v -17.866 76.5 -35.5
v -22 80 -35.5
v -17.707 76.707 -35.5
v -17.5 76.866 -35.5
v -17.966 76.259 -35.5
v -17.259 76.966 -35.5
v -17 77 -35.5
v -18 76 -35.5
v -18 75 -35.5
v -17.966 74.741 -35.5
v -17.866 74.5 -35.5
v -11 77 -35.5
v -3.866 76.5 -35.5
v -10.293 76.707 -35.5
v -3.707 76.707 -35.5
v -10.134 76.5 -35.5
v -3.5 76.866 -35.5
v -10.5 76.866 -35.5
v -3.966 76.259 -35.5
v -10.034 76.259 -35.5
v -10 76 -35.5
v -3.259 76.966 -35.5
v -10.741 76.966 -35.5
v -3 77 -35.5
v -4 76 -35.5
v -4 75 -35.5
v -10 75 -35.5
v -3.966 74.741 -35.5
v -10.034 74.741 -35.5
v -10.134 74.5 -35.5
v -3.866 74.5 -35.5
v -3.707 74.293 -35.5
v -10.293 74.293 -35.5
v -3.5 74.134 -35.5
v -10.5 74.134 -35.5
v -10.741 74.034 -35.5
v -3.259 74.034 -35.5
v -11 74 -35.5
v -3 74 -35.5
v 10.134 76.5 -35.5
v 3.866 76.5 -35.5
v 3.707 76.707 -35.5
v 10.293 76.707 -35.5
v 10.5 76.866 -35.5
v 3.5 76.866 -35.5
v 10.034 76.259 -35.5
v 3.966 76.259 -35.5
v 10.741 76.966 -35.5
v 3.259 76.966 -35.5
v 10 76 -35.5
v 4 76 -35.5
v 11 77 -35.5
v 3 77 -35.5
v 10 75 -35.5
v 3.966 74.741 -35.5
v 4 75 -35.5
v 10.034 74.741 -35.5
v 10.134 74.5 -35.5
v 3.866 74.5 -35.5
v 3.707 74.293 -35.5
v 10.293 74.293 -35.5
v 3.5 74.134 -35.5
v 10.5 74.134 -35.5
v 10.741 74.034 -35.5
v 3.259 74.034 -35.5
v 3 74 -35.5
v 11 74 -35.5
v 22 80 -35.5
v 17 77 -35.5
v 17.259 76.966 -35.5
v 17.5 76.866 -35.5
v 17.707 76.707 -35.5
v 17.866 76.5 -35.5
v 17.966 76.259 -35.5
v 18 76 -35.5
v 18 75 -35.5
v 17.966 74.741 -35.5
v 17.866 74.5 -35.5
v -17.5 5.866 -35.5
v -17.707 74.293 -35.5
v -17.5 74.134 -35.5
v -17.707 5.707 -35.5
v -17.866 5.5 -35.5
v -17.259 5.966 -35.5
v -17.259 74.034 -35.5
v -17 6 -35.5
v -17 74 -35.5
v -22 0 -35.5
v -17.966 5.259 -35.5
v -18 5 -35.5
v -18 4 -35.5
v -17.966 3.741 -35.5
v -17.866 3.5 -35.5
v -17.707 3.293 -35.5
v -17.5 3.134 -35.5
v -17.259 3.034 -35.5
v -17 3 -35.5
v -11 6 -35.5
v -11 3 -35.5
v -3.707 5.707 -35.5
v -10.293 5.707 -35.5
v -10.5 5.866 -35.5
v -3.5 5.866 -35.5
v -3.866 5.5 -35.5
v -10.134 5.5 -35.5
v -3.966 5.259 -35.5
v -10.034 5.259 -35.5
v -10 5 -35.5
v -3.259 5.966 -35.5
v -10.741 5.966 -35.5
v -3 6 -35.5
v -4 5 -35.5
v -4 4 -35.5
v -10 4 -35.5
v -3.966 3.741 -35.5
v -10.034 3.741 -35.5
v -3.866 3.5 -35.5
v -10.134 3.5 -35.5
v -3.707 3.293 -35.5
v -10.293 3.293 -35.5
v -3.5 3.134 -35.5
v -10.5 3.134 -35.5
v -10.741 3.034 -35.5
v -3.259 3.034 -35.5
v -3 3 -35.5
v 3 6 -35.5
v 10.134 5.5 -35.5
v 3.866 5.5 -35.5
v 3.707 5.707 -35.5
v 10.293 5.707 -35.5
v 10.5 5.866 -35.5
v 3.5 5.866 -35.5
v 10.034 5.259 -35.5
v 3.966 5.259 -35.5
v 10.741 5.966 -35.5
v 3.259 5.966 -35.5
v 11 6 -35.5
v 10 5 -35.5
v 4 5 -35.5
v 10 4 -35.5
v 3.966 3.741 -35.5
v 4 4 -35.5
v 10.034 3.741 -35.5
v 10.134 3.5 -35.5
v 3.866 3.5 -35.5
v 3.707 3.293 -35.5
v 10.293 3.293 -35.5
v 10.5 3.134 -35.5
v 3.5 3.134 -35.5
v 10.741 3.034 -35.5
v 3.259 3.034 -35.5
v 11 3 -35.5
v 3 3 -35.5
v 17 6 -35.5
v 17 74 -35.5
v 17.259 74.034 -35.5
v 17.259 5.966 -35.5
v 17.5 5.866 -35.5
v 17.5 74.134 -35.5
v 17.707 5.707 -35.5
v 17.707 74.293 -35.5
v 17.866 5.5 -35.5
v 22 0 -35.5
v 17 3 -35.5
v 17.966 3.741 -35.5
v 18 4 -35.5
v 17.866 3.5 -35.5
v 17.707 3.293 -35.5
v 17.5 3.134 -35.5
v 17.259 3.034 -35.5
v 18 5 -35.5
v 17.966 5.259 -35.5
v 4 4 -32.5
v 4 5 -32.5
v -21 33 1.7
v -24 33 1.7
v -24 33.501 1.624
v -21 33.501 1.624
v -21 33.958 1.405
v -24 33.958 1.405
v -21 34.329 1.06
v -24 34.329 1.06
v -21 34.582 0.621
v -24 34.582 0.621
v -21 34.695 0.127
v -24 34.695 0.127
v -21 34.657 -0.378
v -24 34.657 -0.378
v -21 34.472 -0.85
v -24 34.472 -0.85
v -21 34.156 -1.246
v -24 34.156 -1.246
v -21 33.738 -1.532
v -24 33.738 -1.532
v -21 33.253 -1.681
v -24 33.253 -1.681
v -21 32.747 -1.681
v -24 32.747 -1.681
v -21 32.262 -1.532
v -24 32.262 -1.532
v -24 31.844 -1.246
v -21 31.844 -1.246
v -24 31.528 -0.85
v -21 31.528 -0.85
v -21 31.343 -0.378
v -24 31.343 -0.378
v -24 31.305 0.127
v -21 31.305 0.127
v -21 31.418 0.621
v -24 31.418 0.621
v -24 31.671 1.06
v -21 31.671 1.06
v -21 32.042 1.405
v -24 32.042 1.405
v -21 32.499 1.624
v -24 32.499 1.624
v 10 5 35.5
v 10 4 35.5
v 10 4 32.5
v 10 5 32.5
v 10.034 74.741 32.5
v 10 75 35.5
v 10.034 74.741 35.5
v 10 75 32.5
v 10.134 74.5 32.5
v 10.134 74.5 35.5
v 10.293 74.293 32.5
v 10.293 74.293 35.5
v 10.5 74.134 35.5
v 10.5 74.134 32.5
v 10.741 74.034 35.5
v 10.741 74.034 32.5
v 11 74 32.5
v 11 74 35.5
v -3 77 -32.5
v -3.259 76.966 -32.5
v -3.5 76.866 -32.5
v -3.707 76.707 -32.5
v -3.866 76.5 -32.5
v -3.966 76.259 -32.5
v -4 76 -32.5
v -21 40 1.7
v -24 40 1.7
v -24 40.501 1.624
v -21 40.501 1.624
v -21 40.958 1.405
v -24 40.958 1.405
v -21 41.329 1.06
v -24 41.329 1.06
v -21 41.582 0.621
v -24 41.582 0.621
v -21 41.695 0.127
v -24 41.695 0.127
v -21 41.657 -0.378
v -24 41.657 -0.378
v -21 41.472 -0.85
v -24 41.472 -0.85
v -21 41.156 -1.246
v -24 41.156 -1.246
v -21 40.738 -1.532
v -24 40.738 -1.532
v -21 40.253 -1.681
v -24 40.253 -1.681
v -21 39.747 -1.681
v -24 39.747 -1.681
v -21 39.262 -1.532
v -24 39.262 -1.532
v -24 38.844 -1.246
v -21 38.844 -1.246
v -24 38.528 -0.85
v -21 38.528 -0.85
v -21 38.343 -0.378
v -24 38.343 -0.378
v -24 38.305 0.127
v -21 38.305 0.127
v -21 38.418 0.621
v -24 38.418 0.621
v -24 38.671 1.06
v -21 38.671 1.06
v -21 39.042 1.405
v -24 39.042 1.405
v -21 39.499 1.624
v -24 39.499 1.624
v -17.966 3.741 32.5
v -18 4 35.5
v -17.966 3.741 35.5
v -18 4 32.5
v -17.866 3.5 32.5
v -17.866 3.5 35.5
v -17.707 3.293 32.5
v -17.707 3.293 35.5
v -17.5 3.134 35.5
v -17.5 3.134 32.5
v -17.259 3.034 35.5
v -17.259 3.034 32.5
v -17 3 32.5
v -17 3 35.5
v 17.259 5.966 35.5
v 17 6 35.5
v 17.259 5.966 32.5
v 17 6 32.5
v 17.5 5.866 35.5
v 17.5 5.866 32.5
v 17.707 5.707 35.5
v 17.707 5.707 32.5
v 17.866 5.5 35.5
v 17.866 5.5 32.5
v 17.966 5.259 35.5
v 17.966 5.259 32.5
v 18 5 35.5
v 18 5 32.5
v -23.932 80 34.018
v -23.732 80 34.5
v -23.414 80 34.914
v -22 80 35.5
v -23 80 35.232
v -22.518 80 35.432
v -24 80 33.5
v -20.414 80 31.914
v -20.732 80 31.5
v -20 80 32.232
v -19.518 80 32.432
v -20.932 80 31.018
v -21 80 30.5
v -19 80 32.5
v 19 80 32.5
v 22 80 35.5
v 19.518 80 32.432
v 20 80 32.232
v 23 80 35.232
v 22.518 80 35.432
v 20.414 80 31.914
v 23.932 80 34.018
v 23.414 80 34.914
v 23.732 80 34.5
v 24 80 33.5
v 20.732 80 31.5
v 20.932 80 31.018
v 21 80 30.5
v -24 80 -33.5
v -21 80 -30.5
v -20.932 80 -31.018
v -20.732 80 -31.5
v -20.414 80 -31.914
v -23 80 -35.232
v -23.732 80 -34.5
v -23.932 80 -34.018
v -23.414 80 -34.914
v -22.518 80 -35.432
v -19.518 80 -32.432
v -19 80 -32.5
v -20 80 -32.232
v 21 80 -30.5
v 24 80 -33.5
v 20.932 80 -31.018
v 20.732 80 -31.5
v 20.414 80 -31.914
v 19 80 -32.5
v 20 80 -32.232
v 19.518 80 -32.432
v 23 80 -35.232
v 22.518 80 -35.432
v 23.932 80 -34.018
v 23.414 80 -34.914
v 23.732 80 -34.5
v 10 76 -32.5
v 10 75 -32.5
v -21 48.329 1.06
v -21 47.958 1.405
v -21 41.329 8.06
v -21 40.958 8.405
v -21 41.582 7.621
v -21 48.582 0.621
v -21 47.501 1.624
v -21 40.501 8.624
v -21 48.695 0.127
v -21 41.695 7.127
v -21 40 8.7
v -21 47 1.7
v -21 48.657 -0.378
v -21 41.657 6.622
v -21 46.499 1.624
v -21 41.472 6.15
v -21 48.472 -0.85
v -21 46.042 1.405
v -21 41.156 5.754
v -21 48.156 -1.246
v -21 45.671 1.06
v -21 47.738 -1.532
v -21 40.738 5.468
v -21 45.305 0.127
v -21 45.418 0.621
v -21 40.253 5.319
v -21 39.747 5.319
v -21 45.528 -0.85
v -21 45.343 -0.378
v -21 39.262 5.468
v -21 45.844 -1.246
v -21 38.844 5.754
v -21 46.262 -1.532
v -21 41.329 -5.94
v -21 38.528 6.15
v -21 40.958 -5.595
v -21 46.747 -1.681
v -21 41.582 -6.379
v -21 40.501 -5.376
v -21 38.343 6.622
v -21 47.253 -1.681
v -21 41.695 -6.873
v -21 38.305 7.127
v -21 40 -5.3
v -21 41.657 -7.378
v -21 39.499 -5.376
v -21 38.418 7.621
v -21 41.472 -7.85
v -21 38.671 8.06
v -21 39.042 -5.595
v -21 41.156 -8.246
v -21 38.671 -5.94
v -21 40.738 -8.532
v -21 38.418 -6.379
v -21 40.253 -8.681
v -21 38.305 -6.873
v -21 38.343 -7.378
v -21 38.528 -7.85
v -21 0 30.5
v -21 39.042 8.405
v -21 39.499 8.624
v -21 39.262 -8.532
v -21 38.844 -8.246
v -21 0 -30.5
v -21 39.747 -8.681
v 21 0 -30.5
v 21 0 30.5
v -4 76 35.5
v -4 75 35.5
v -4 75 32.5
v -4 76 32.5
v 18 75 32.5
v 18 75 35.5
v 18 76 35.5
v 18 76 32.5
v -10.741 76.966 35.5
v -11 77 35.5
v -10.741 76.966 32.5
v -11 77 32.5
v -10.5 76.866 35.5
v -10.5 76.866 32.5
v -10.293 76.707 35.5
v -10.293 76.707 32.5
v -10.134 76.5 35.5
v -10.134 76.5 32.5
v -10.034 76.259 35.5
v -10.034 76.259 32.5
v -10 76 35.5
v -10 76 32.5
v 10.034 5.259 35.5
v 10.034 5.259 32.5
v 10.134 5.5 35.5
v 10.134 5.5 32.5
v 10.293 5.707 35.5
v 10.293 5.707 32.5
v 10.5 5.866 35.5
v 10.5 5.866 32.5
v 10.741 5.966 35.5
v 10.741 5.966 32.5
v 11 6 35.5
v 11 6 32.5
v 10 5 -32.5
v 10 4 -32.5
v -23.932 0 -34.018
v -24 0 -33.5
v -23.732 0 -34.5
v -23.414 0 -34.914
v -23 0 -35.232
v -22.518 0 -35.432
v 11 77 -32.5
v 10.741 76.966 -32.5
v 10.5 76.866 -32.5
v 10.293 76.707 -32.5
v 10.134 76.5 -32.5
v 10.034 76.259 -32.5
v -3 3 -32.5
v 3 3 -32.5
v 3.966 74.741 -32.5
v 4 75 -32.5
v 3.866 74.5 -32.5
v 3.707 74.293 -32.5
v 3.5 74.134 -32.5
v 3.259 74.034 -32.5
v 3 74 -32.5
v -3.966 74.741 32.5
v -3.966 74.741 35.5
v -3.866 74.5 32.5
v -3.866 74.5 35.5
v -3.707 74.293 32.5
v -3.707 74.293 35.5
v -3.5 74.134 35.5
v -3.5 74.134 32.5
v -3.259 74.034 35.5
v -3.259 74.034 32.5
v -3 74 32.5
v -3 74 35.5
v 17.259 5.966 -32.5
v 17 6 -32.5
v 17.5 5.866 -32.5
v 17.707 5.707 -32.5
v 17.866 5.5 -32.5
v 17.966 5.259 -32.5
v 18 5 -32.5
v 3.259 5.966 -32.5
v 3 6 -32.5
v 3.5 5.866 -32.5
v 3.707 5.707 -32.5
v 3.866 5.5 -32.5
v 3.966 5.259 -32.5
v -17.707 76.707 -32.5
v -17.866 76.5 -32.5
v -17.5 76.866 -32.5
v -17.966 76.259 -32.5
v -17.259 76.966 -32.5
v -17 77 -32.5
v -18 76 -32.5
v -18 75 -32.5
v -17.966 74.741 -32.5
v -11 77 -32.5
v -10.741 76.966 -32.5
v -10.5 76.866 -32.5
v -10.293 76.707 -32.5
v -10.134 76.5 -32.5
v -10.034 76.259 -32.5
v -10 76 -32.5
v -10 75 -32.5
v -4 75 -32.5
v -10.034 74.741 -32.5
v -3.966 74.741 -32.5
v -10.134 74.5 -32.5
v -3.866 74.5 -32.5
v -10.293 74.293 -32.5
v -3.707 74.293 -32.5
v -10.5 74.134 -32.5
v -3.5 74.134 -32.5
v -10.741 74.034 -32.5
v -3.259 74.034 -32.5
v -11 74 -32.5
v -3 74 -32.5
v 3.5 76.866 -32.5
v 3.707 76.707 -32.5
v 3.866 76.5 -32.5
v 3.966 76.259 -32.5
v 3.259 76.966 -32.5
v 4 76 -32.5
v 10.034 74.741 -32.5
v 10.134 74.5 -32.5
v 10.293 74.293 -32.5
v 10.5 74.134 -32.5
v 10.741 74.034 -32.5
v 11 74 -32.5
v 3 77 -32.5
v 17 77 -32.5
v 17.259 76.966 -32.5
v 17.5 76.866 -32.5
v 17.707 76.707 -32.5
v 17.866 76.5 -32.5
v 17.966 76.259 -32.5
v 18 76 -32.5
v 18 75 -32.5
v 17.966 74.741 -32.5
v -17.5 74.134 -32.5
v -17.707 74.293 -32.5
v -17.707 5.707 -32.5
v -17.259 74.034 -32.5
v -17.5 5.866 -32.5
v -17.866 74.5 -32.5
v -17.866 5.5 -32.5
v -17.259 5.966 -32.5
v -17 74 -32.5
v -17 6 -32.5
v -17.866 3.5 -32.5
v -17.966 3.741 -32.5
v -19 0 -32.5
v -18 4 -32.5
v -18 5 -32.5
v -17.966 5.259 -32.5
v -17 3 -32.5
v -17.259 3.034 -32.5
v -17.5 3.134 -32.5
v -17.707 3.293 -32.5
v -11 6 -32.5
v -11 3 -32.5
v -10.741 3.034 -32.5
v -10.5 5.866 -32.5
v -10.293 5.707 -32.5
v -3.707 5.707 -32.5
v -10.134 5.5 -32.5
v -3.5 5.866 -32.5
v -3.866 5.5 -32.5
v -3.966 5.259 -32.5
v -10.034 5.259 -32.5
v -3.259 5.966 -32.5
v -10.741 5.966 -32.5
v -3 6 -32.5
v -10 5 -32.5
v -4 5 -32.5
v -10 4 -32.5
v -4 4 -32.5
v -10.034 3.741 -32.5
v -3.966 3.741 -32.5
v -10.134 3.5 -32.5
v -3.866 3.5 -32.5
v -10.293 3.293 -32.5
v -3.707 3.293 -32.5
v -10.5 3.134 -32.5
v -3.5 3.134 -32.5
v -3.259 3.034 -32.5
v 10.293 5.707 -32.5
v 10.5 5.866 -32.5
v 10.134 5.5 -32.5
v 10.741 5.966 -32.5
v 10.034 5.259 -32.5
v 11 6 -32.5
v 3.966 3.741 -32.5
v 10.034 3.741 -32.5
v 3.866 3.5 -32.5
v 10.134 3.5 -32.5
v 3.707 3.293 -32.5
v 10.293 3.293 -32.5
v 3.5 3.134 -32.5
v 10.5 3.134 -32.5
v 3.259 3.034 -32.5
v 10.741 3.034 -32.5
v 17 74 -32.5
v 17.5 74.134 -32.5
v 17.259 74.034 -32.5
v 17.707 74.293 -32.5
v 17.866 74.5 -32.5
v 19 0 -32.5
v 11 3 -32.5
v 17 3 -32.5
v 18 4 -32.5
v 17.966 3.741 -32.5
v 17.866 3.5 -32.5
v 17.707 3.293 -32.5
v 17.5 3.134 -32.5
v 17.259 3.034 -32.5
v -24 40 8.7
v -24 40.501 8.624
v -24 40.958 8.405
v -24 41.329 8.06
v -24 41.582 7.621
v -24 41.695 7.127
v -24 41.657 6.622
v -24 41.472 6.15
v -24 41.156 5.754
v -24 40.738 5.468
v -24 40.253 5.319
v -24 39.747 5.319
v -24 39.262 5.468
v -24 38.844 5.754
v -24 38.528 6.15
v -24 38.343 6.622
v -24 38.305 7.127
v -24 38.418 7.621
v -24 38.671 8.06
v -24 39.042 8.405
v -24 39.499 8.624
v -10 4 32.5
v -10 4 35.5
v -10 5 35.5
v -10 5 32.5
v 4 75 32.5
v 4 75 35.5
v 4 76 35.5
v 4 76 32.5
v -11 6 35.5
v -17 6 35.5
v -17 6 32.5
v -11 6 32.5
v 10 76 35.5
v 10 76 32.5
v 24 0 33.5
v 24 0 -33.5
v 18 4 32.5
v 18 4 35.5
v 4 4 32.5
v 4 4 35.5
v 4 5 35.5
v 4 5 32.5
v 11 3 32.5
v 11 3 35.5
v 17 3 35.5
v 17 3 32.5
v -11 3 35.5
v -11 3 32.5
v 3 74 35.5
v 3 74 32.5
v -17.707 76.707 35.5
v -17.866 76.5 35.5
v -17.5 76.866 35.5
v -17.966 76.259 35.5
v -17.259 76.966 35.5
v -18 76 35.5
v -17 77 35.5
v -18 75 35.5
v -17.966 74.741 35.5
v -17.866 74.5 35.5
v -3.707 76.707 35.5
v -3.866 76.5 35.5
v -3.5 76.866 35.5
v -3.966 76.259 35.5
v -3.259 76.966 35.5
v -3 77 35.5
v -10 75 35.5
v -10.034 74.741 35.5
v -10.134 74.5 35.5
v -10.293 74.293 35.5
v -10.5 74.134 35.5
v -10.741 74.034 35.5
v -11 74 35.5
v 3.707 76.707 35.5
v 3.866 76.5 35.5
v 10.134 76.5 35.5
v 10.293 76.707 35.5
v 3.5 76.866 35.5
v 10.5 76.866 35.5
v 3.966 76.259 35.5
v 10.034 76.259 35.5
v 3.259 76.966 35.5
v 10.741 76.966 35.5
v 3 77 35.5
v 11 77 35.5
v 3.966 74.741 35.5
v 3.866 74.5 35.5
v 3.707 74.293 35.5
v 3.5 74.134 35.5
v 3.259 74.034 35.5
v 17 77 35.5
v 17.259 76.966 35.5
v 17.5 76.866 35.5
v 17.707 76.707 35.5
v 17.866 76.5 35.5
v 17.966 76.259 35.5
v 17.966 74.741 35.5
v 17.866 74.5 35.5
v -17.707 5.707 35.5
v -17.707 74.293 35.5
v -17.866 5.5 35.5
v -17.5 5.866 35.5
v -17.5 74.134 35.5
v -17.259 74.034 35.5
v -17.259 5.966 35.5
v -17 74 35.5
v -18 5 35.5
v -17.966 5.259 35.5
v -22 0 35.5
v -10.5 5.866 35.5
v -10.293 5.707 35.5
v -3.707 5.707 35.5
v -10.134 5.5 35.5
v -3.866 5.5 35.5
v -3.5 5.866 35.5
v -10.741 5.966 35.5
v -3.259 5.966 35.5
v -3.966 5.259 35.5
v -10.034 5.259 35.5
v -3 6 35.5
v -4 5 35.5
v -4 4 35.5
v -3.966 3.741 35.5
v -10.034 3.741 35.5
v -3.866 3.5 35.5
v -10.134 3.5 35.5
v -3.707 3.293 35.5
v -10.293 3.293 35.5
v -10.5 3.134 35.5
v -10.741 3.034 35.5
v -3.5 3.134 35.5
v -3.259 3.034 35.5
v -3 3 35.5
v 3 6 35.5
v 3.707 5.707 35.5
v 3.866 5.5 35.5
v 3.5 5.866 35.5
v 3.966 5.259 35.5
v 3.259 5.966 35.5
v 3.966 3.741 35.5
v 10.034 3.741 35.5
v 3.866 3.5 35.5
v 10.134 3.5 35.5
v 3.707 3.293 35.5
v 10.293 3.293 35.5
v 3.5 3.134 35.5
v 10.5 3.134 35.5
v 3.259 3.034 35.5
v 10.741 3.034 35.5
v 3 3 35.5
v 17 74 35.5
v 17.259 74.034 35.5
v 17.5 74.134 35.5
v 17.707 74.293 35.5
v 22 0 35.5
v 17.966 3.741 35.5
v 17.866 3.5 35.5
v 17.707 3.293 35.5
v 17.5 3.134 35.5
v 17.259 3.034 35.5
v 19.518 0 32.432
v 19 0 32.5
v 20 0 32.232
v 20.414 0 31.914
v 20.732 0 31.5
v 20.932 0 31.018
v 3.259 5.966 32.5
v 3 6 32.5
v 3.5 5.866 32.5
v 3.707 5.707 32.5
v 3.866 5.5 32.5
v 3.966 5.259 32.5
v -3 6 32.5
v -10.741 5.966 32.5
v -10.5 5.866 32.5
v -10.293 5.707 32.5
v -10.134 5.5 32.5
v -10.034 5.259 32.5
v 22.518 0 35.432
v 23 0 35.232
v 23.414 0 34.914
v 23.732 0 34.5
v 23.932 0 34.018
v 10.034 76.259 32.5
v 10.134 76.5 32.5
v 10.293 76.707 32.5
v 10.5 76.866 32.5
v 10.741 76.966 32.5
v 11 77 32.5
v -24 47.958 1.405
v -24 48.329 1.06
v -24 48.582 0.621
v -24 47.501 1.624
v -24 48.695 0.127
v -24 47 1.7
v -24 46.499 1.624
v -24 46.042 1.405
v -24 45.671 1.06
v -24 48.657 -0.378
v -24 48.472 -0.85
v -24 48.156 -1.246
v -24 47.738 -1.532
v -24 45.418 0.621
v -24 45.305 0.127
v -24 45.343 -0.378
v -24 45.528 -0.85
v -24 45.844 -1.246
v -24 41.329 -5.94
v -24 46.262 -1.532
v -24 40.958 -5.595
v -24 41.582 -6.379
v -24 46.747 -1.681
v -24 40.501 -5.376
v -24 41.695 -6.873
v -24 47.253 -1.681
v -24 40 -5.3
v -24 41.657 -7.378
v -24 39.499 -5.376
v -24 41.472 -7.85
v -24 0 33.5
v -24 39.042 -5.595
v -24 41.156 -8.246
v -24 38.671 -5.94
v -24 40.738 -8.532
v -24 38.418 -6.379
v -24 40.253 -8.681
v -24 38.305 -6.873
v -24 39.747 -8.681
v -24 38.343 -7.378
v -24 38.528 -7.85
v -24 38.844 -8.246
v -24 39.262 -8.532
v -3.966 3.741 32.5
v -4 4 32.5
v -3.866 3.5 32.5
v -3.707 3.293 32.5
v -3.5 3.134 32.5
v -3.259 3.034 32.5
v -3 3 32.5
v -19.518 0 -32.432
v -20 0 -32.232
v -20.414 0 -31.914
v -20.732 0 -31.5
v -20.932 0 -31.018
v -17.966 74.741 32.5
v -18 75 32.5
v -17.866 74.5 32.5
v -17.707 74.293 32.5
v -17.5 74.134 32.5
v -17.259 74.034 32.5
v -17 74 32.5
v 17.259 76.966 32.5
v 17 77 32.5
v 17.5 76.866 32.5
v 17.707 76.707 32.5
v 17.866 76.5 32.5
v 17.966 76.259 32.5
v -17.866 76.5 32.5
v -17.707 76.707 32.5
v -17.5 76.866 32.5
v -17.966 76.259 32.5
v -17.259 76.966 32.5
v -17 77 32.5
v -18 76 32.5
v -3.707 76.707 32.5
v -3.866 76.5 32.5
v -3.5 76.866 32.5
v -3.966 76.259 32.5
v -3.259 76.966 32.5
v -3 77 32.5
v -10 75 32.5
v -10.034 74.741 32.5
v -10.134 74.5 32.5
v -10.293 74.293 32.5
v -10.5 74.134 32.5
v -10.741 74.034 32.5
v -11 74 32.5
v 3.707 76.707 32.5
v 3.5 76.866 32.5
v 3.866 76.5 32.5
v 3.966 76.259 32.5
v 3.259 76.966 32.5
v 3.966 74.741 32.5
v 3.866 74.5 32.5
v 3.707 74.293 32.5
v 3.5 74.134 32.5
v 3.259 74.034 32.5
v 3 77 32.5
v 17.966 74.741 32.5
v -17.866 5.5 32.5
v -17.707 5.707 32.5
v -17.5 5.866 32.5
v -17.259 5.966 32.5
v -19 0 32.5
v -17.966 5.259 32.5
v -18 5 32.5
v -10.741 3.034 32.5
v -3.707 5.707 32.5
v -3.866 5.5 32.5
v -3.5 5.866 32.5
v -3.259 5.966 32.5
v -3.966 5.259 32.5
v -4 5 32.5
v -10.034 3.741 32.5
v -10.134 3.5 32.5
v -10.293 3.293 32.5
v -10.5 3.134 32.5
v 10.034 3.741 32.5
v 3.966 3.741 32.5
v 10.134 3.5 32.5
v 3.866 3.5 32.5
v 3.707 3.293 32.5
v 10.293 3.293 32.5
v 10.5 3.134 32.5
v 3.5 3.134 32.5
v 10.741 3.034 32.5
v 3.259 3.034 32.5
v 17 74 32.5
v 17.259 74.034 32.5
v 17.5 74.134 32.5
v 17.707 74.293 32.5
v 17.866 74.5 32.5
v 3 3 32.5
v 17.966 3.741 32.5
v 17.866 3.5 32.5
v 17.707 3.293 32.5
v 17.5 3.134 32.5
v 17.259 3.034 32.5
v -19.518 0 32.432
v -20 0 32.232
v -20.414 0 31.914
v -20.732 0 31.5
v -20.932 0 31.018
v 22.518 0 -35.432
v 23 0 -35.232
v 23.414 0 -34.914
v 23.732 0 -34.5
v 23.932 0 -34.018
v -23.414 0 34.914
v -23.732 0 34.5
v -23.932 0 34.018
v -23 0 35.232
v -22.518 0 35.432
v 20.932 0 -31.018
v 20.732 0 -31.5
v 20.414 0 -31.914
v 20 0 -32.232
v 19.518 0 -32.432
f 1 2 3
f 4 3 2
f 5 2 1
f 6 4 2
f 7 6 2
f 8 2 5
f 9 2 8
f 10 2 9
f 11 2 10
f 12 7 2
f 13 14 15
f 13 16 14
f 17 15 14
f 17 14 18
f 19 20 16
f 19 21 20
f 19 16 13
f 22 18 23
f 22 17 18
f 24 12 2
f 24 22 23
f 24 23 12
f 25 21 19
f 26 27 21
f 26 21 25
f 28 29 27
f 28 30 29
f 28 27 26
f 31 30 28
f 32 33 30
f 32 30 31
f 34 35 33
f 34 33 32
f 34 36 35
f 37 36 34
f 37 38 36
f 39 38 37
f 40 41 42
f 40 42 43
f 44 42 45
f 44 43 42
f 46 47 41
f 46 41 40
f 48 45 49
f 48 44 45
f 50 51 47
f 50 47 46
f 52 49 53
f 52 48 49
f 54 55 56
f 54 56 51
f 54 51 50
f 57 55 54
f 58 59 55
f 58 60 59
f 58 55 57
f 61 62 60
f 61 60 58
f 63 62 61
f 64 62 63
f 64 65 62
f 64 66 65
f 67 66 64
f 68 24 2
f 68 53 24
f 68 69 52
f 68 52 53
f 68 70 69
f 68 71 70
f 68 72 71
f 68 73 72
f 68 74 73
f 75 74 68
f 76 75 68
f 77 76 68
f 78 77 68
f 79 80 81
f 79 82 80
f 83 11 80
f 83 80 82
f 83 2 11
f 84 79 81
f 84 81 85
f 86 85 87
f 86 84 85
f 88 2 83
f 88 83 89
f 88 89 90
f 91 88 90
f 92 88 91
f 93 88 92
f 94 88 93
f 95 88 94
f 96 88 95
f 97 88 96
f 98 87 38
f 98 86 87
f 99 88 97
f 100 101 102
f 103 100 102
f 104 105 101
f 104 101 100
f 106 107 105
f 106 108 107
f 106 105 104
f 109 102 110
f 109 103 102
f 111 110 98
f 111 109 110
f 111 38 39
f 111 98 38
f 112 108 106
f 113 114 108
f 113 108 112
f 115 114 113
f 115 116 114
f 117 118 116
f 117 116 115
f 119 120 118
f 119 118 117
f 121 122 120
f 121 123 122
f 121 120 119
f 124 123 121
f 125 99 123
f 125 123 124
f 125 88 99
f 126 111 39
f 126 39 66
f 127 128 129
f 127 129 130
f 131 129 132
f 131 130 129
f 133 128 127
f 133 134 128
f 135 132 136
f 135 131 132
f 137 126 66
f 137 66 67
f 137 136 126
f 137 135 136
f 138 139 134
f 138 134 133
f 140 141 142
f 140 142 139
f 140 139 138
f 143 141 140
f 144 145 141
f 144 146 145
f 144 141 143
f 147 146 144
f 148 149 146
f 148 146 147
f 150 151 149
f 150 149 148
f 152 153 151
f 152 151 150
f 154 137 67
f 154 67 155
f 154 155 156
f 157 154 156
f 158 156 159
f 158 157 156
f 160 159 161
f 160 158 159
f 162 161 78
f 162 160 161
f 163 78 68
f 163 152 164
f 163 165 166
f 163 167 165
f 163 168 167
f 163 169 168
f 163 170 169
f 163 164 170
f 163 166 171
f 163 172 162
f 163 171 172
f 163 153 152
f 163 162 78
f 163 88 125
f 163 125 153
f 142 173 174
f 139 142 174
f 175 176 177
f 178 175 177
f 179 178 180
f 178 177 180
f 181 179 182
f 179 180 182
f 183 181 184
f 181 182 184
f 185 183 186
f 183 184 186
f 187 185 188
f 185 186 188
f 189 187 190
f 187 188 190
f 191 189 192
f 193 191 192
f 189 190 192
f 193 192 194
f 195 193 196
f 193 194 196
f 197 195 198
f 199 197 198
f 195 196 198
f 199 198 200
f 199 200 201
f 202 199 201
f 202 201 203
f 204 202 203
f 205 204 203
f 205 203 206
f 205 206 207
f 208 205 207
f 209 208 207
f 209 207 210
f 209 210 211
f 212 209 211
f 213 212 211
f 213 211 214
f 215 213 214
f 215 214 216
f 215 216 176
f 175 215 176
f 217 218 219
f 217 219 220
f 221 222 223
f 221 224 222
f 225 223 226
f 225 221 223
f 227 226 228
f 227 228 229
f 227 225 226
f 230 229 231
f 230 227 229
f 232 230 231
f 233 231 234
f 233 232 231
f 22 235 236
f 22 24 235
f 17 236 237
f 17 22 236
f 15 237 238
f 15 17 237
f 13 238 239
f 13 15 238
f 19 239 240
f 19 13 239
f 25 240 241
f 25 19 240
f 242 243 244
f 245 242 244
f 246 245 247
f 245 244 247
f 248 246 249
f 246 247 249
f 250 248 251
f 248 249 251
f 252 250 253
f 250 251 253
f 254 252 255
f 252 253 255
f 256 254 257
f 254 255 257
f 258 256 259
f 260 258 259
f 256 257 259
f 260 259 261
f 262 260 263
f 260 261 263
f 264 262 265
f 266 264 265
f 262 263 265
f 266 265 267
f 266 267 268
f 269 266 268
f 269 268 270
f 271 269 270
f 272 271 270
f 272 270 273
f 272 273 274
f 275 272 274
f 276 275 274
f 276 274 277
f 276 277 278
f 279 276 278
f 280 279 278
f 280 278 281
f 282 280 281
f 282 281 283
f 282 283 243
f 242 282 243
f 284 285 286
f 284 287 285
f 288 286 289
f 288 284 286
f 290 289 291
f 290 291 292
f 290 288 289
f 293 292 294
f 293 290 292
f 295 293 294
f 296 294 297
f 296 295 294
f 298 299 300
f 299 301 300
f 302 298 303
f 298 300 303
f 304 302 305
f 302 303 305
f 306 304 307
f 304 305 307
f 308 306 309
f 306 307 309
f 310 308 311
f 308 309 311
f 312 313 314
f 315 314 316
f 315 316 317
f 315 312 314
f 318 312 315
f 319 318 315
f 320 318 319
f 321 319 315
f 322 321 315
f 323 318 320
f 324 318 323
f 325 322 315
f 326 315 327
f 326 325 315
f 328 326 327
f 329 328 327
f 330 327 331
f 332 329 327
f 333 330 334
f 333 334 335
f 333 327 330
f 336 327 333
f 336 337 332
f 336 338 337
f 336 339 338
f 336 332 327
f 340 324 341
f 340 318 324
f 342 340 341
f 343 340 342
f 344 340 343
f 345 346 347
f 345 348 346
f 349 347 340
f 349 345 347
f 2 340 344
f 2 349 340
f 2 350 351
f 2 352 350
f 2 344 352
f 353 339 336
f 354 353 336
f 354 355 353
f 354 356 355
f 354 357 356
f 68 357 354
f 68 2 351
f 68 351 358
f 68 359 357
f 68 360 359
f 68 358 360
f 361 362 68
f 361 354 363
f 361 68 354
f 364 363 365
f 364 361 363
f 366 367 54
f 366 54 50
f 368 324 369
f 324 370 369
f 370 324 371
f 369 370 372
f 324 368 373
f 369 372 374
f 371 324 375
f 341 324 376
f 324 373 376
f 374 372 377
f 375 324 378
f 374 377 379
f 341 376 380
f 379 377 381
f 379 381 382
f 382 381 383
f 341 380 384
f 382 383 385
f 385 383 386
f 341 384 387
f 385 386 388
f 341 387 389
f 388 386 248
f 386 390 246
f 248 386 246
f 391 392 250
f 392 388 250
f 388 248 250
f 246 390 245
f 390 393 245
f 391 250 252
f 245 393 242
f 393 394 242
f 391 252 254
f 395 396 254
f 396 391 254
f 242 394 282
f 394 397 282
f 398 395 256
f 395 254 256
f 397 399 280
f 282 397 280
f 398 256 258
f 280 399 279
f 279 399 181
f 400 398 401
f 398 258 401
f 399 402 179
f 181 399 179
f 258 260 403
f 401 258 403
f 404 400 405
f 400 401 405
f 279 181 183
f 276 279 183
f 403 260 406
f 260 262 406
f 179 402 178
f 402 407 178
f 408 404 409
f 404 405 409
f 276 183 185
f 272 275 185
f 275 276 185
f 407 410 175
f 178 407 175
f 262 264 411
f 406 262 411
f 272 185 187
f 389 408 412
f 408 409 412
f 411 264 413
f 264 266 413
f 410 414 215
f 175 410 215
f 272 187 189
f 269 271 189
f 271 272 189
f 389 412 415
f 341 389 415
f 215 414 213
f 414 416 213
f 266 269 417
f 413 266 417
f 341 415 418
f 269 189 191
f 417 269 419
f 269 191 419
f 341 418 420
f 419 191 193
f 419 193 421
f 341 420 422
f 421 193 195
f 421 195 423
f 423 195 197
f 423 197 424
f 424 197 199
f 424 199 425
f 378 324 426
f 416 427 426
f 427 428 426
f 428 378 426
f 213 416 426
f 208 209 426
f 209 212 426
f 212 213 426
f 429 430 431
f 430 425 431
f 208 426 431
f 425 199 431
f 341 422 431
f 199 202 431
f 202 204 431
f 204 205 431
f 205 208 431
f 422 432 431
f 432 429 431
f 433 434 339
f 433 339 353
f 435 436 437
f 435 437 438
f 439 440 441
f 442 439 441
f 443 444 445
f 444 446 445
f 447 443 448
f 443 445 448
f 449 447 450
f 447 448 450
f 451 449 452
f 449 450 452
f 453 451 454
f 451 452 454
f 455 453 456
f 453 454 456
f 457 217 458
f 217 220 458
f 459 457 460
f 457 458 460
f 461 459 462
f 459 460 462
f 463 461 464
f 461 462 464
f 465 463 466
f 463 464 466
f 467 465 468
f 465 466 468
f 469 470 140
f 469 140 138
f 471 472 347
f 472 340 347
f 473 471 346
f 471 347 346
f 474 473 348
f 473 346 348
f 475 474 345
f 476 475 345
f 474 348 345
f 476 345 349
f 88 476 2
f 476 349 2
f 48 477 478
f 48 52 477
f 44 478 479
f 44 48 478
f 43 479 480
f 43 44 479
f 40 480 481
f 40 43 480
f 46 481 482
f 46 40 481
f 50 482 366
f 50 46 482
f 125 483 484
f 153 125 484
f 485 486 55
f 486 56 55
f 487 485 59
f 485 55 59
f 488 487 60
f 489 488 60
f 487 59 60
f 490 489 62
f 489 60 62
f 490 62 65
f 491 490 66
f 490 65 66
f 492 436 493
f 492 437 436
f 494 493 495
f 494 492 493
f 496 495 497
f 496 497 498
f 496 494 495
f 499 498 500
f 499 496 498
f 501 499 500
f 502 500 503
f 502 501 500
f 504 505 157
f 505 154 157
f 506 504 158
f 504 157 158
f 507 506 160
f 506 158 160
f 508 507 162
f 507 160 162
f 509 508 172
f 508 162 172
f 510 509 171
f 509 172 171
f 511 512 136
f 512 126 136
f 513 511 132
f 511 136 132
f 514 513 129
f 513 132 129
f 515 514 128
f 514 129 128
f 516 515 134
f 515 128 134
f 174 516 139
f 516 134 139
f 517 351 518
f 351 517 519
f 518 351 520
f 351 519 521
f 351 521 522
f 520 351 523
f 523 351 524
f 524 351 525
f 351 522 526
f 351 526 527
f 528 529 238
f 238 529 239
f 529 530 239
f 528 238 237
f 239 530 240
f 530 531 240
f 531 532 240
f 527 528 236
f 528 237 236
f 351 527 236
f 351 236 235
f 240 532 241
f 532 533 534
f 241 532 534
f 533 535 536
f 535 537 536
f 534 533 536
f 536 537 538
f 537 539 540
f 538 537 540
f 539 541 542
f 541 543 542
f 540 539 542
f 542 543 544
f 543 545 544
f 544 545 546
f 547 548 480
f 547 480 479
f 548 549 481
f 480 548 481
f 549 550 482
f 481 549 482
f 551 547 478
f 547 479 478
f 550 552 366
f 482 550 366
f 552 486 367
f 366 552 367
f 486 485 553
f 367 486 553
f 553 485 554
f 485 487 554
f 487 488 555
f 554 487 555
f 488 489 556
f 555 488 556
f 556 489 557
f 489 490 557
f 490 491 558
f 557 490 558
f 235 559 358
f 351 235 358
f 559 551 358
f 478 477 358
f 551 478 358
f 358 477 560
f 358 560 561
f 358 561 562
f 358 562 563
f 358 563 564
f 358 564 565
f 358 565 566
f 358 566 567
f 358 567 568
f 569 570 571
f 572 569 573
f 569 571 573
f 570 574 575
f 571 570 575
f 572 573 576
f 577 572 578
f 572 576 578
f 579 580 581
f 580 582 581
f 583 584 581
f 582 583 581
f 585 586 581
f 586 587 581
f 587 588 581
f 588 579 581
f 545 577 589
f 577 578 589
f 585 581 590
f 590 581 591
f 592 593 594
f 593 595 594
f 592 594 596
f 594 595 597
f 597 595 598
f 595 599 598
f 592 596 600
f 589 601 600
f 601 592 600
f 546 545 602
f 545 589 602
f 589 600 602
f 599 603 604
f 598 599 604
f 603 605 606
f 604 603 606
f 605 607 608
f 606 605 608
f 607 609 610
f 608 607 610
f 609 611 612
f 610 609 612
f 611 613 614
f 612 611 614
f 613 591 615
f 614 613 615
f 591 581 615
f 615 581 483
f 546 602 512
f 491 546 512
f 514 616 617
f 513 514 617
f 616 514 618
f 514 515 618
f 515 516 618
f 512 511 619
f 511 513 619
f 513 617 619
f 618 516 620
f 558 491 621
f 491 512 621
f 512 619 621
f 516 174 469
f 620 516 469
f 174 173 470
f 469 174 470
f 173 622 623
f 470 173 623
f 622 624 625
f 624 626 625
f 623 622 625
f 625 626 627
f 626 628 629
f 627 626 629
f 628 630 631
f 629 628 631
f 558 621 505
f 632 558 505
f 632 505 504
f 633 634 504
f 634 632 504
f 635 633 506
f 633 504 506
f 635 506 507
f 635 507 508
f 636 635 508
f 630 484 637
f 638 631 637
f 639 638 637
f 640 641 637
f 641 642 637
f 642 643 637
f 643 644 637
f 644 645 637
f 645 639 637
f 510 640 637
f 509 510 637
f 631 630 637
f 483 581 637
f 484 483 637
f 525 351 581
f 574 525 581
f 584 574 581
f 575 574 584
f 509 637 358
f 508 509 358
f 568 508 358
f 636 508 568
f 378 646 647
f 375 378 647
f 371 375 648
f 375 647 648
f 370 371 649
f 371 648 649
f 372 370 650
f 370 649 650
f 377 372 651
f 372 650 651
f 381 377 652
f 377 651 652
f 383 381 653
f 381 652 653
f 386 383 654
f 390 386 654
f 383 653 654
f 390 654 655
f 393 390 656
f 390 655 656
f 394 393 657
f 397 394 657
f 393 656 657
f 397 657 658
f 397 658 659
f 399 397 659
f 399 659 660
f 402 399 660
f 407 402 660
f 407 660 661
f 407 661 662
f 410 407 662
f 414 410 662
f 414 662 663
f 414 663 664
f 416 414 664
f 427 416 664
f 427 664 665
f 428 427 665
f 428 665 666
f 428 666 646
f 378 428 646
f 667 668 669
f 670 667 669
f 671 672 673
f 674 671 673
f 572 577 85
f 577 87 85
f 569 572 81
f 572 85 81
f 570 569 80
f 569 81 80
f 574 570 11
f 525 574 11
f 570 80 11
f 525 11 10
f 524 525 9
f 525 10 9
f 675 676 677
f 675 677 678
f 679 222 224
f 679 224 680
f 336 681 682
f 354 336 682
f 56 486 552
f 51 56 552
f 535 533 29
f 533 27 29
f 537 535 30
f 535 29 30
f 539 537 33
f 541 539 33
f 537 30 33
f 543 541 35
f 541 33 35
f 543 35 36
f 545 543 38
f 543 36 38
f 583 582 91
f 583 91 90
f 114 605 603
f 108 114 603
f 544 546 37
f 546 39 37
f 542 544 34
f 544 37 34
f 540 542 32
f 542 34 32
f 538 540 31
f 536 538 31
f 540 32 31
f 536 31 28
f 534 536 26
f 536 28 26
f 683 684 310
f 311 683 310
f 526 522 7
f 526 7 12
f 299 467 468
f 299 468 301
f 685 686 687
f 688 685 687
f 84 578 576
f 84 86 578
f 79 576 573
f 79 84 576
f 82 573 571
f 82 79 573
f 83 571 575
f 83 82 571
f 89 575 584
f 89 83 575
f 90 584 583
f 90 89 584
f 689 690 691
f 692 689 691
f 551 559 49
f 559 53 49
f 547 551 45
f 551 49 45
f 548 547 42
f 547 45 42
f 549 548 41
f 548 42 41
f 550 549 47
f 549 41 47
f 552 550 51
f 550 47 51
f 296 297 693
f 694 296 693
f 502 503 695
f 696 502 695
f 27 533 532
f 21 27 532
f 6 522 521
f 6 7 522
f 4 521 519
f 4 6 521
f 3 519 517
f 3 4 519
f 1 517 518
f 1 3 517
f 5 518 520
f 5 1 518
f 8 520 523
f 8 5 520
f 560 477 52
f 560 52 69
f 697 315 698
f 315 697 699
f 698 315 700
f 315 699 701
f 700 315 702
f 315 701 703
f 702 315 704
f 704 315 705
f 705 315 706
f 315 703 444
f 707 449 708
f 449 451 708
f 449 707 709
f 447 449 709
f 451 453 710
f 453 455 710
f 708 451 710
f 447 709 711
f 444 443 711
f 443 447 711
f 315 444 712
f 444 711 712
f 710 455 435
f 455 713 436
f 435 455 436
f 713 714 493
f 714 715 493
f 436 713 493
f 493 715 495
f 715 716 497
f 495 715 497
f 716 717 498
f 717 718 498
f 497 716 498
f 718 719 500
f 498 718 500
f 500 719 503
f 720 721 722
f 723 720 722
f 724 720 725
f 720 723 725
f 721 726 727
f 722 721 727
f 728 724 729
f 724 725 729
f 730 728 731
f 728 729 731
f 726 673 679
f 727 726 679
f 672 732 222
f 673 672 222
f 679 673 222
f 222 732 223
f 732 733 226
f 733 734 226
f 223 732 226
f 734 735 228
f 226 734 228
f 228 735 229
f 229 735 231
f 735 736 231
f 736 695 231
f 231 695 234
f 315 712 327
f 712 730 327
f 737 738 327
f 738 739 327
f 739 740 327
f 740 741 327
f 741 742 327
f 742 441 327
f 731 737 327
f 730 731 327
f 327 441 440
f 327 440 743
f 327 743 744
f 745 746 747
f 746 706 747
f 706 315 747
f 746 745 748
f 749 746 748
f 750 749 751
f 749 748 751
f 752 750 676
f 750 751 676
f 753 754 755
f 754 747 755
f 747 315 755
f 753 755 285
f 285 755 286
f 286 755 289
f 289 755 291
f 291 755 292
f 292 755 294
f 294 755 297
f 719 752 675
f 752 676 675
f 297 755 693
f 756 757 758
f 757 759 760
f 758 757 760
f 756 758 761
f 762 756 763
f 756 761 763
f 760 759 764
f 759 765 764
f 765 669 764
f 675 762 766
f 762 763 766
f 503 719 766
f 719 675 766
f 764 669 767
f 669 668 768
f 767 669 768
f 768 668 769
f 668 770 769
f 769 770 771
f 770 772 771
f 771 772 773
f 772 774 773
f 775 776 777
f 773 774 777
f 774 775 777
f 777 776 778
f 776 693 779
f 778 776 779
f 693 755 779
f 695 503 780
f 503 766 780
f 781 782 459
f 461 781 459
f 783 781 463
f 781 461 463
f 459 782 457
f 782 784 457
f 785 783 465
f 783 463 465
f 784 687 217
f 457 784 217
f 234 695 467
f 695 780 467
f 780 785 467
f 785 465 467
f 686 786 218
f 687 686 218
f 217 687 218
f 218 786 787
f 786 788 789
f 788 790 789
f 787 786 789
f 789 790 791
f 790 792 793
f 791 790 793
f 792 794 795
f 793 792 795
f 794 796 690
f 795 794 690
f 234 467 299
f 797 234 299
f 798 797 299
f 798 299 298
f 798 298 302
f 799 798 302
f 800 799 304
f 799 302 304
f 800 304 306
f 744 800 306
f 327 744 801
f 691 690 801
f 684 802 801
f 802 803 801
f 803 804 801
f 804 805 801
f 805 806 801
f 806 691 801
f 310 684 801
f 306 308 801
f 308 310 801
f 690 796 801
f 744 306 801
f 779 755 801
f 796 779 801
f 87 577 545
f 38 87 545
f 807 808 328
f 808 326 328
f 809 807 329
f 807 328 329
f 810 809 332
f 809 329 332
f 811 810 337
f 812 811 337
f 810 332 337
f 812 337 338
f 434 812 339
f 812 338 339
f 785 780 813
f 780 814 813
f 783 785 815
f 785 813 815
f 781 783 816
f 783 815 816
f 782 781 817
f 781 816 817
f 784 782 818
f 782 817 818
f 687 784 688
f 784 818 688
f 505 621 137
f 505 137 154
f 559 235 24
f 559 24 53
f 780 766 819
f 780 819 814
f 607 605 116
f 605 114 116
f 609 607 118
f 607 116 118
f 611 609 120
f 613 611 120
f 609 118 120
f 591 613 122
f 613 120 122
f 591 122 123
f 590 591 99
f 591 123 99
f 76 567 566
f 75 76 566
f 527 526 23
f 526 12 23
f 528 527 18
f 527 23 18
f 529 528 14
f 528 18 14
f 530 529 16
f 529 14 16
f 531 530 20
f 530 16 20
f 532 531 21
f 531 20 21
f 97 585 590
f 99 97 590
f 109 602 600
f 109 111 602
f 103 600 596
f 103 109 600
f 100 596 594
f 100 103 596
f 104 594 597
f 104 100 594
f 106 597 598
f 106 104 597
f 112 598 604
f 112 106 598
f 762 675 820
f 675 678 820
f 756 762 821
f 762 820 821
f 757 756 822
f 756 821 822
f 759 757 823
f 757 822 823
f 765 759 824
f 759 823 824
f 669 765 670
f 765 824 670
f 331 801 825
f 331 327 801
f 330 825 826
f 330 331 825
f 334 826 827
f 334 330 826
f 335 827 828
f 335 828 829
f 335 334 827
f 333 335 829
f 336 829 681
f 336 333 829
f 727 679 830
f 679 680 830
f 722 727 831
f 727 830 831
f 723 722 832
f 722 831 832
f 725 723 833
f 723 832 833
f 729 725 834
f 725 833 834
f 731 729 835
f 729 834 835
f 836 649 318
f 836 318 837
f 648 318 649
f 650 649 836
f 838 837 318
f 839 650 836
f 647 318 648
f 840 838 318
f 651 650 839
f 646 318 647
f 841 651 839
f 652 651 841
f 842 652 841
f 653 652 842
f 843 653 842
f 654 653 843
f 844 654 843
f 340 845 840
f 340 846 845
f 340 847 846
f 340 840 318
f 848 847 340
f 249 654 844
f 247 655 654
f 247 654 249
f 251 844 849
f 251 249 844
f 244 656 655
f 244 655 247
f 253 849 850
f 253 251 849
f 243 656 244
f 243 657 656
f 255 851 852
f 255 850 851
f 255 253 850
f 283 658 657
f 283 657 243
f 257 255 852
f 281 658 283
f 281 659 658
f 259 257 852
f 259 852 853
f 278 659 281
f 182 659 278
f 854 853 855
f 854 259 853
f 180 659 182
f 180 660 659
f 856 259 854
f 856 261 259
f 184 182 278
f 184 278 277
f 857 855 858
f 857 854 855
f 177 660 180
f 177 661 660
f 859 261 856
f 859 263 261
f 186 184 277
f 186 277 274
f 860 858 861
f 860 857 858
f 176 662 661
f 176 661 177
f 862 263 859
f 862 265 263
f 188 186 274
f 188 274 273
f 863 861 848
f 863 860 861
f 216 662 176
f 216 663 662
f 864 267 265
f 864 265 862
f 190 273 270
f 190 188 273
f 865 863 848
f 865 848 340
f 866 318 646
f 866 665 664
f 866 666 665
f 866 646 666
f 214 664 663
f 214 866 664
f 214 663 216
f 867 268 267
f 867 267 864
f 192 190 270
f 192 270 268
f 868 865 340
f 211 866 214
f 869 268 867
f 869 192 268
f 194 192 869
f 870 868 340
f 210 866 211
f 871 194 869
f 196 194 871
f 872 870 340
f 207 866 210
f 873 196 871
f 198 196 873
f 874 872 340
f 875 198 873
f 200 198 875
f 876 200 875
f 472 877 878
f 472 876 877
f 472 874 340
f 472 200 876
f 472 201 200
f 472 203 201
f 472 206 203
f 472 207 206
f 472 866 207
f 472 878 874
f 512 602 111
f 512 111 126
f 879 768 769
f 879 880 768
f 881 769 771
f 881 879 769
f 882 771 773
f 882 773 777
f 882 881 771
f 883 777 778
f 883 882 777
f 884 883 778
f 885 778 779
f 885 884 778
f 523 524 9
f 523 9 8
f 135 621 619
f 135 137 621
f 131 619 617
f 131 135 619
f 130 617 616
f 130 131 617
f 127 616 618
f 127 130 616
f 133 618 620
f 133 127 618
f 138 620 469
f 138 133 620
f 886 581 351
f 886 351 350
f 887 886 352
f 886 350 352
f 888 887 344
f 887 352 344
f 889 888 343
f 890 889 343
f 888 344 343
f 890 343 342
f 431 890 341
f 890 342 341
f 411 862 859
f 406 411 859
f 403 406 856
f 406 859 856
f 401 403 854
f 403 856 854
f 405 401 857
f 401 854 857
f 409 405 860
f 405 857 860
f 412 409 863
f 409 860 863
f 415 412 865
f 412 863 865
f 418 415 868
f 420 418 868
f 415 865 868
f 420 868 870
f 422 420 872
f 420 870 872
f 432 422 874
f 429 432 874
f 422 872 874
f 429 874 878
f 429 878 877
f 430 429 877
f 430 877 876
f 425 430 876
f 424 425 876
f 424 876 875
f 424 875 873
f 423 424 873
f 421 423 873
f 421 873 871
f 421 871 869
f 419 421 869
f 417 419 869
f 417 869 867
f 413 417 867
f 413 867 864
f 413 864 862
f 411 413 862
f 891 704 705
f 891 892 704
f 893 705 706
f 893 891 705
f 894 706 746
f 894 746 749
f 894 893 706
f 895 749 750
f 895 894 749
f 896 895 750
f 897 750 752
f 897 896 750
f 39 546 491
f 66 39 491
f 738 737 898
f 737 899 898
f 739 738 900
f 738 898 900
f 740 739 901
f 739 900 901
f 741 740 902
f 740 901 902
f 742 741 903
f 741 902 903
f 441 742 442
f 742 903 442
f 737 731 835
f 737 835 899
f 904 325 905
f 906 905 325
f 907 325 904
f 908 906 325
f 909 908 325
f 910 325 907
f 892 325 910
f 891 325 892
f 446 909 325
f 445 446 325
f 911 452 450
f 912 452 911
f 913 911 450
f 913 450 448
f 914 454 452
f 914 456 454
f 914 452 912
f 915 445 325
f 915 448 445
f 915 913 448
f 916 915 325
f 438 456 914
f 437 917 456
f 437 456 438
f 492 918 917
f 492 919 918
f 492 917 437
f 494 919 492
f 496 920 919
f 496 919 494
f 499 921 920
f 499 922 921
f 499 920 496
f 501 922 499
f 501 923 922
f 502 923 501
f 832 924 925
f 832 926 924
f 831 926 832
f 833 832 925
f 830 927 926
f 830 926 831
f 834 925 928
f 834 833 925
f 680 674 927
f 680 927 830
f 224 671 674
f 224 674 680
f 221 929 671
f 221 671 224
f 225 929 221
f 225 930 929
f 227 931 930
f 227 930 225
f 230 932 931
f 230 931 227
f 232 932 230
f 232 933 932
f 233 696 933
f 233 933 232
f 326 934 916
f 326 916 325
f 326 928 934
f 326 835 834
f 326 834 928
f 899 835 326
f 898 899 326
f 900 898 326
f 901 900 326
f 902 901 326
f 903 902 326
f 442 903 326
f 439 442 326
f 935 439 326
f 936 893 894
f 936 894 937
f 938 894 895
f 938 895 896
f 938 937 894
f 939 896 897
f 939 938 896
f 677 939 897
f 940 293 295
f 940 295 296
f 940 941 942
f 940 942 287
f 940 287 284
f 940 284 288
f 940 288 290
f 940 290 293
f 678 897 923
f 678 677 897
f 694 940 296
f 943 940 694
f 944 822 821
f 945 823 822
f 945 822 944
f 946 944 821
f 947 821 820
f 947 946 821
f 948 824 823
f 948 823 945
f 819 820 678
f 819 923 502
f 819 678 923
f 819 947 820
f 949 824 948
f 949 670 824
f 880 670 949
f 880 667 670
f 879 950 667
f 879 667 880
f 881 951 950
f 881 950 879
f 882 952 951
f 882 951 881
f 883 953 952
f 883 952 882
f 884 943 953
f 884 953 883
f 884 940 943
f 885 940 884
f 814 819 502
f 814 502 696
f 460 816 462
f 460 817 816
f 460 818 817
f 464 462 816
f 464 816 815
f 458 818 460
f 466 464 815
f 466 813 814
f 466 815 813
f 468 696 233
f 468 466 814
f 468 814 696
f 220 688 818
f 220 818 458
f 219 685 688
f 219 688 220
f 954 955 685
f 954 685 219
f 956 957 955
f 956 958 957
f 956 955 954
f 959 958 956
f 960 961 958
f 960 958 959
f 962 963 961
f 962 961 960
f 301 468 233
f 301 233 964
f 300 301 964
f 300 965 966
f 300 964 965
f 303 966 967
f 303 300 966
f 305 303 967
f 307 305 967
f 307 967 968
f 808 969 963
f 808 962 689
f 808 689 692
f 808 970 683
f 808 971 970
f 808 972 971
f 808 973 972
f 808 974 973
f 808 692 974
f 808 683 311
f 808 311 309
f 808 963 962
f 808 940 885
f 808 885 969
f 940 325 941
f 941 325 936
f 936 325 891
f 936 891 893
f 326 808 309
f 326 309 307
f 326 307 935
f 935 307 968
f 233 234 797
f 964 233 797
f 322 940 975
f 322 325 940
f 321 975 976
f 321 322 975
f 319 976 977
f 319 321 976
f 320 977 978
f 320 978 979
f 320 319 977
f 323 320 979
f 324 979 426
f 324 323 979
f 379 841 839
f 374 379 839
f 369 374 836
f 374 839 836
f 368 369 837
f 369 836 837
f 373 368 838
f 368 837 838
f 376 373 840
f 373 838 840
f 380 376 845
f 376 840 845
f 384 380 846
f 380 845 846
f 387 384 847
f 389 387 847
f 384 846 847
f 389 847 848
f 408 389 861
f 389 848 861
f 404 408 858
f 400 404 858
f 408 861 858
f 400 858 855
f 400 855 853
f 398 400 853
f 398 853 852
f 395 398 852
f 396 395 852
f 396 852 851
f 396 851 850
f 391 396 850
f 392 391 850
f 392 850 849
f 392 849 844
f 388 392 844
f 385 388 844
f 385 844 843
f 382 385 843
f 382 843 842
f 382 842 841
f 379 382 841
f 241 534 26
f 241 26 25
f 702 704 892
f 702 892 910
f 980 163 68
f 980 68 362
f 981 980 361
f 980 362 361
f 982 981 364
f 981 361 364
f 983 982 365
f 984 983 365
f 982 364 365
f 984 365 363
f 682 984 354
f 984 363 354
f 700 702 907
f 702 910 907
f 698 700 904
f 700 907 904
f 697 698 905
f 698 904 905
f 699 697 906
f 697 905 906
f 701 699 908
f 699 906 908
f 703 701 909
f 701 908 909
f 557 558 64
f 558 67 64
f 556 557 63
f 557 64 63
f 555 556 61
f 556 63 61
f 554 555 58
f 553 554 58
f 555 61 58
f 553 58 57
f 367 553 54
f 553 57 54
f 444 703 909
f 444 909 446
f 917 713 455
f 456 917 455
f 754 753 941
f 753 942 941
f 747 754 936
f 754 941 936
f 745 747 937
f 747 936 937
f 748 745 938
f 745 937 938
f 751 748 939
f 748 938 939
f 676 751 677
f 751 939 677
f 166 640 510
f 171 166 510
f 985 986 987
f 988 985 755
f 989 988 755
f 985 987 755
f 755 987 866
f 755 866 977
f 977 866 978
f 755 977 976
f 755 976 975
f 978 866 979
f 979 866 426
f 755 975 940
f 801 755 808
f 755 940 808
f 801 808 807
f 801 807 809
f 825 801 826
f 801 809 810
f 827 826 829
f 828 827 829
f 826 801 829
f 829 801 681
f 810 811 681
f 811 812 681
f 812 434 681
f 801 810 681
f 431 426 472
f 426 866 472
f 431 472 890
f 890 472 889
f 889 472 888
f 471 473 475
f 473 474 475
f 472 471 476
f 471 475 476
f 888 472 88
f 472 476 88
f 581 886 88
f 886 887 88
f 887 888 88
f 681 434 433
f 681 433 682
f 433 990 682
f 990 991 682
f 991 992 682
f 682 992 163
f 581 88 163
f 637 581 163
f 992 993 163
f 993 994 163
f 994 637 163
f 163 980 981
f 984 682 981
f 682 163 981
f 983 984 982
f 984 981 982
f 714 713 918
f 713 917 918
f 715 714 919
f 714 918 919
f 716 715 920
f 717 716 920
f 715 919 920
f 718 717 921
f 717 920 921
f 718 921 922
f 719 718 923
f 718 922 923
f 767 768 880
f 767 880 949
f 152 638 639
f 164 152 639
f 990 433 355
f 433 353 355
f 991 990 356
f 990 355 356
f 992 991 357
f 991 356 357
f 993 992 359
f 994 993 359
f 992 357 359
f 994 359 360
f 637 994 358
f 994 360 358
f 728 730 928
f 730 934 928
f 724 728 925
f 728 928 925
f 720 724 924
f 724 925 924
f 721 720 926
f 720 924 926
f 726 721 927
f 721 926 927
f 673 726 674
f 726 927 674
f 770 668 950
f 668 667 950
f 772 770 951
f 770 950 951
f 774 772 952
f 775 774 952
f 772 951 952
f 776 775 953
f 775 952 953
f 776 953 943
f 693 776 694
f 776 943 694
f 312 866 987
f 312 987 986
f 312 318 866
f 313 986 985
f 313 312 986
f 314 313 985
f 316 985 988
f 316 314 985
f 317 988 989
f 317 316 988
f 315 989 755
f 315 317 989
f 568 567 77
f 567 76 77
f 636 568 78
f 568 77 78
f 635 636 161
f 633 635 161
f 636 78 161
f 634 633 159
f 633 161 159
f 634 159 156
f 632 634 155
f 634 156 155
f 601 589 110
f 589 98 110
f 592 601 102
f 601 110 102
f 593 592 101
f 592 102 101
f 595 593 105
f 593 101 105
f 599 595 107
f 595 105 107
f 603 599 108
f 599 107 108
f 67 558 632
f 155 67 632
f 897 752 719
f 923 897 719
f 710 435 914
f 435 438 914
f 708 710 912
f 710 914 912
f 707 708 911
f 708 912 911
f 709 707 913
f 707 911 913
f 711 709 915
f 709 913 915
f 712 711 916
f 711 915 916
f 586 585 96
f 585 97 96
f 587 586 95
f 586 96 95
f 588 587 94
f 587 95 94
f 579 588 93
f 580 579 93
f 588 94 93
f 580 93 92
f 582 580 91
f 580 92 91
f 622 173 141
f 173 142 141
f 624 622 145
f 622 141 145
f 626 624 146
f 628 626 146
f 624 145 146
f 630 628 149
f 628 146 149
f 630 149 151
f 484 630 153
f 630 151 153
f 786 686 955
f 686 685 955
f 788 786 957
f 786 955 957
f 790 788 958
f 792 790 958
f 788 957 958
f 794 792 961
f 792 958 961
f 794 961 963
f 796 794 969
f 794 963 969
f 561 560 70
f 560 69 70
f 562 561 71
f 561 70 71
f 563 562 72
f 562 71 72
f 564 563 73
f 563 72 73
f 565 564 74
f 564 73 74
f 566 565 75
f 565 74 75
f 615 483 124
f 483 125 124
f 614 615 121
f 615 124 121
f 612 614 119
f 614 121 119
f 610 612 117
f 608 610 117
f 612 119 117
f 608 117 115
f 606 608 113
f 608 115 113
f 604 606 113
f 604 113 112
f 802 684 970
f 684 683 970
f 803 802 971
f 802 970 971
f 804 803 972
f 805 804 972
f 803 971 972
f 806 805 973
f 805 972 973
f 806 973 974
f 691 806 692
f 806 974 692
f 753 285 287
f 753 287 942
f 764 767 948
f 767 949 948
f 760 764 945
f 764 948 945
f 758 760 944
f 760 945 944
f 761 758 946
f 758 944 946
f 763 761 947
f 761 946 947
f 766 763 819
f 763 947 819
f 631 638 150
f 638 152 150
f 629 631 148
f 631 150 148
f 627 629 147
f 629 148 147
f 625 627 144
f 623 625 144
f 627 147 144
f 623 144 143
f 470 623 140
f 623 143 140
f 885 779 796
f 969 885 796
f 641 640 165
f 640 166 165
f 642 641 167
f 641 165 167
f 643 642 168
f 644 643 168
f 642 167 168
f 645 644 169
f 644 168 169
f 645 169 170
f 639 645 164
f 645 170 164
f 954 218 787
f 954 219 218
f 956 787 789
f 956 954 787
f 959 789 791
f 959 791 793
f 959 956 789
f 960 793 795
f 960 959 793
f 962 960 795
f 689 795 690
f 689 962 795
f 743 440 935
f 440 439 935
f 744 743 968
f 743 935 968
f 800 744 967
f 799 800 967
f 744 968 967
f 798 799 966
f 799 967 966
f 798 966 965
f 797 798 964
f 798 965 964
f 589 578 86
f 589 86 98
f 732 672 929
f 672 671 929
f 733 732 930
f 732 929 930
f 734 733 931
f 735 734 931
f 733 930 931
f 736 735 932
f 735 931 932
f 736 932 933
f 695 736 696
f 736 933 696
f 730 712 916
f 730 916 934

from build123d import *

# Parameters (mm, degrees)
SKETCH1_W                = 48
SKETCH1_H                = 71
SKETCH1_W_2              = 42
SKETCH1_H_2              = 65
BOSS_EXTRUDE1_DEPTH      = 80
M3_CLEARANCE_HOLE1_D     = 3.4
M3_CLEARANCE_HOLE1_DEPTH = 3
SKETCH5_W                = 8
SKETCH5_H                = 3
CUT_EXTRUDE1_DEPTH       = 110.622078068
FILLET1_R                = 2
FILLET2_R                = 1


with BuildPart() as part:
    # Sketch1 → Boss-Extrude1 (new body)
    with BuildSketch(Plane(origin=(0, 0, 0), x_dir=(1, 0, 0), z_dir=(0, 1, 0))):
        Rectangle(SKETCH1_W, SKETCH1_H)
        Rectangle(SKETCH1_W_2, SKETCH1_H_2, mode=Mode.SUBTRACT)
    extrude(amount=BOSS_EXTRUDE1_DEPTH)

    # M3 Clearance Hole1
    with Locations(Plane(origin=(-21, 0, 0), x_dir=(0, 0, -1), z_dir=(1, 0, 0))):
        with Locations((0, 40), (0, 47), (7, 40), (0, 33), (-7, 40)):
            Hole(M3_CLEARANCE_HOLE1_D / 2, depth=M3_CLEARANCE_HOLE1_DEPTH)

    # Sketch5 → Cut-Extrude1 (cut, through all)
    with BuildSketch(Plane.XY.offset(35.5)):
        with Locations((0, 4.5)):
            Rectangle(SKETCH5_W, SKETCH5_H)
        with Locations((0, 75.5)):
            Rectangle(SKETCH5_W, SKETCH5_H)
        with Locations((14, 4.5)):
            Rectangle(SKETCH5_W, SKETCH5_H)
        with Locations((-14, 4.5)):
            Rectangle(SKETCH5_W, SKETCH5_H)
        with Locations((-14, 75.5)):
            Rectangle(SKETCH5_W, SKETCH5_H)
        with Locations((14, 75.5)):
            Rectangle(SKETCH5_W, SKETCH5_H)
    extrude(amount=-CUT_EXTRUDE1_DEPTH, mode=Mode.SUBTRACT)

    # Fillet1
    fillet1_edges = [part.edges().sort_by_distance(p)[0] for p in [
        (21, 40, 32.5),
        (21, 40, -32.5),
        (-21, 40, -32.5),
        (-21, 40, 32.5),
        (-24, 40, -35.5),
        (24, 40, -35.5),
        (24, 40, 35.5),
        (-24, 40, 35.5),
    ]]
    fillet(fillet1_edges, radius=FILLET1_R)

    # Fillet2
    fillet2_edges = [part.edges().sort_by_distance(p)[0] for p in [
        (-4, 74, -34),
        (-4, 77, -34),
        (4, 77, -34),
        (4, 74, -34),
        (-4, 74, 34),
        (-4, 77, 34),
        (4, 77, 34),
        (4, 74, 34),
        (18, 6, -34),
        (18, 3, -34),
        (10, 3, -34),
        (10, 6, -34),
        (18, 6, 34),
        (18, 3, 34),
        (10, 3, 34),
        (10, 6, 34),
        (-10, 6, -34),
        (-10, 3, -34),
        (-18, 3, -34),
        (-18, 6, -34),
        (-10, 6, 34),
        (-10, 3, 34),
        (-18, 3, 34),
        (-18, 6, 34),
        (-18, 74, -34),
        (-18, 77, -34),
        (-10, 77, -34),
        (-10, 74, -34),
        (-18, 74, 34),
        (-18, 77, 34),
        (-10, 77, 34),
        (-10, 74, 34),
        (10, 74, -34),
        (10, 77, -34),
        (18, 77, -34),
        (18, 74, -34),
        (10, 74, 34),
        (10, 77, 34),
        (18, 77, 34),
        (18, 74, 34),
        (4, 6, -34),
        (4, 3, -34),
        (-4, 3, -34),
        (-4, 6, -34),
        (4, 6, 34),
        (4, 3, 34),
        (-4, 3, 34),
        (-4, 6, 34),
    ]]
    fillet(fillet2_edges, radius=FILLET2_R)


solid = part.part
